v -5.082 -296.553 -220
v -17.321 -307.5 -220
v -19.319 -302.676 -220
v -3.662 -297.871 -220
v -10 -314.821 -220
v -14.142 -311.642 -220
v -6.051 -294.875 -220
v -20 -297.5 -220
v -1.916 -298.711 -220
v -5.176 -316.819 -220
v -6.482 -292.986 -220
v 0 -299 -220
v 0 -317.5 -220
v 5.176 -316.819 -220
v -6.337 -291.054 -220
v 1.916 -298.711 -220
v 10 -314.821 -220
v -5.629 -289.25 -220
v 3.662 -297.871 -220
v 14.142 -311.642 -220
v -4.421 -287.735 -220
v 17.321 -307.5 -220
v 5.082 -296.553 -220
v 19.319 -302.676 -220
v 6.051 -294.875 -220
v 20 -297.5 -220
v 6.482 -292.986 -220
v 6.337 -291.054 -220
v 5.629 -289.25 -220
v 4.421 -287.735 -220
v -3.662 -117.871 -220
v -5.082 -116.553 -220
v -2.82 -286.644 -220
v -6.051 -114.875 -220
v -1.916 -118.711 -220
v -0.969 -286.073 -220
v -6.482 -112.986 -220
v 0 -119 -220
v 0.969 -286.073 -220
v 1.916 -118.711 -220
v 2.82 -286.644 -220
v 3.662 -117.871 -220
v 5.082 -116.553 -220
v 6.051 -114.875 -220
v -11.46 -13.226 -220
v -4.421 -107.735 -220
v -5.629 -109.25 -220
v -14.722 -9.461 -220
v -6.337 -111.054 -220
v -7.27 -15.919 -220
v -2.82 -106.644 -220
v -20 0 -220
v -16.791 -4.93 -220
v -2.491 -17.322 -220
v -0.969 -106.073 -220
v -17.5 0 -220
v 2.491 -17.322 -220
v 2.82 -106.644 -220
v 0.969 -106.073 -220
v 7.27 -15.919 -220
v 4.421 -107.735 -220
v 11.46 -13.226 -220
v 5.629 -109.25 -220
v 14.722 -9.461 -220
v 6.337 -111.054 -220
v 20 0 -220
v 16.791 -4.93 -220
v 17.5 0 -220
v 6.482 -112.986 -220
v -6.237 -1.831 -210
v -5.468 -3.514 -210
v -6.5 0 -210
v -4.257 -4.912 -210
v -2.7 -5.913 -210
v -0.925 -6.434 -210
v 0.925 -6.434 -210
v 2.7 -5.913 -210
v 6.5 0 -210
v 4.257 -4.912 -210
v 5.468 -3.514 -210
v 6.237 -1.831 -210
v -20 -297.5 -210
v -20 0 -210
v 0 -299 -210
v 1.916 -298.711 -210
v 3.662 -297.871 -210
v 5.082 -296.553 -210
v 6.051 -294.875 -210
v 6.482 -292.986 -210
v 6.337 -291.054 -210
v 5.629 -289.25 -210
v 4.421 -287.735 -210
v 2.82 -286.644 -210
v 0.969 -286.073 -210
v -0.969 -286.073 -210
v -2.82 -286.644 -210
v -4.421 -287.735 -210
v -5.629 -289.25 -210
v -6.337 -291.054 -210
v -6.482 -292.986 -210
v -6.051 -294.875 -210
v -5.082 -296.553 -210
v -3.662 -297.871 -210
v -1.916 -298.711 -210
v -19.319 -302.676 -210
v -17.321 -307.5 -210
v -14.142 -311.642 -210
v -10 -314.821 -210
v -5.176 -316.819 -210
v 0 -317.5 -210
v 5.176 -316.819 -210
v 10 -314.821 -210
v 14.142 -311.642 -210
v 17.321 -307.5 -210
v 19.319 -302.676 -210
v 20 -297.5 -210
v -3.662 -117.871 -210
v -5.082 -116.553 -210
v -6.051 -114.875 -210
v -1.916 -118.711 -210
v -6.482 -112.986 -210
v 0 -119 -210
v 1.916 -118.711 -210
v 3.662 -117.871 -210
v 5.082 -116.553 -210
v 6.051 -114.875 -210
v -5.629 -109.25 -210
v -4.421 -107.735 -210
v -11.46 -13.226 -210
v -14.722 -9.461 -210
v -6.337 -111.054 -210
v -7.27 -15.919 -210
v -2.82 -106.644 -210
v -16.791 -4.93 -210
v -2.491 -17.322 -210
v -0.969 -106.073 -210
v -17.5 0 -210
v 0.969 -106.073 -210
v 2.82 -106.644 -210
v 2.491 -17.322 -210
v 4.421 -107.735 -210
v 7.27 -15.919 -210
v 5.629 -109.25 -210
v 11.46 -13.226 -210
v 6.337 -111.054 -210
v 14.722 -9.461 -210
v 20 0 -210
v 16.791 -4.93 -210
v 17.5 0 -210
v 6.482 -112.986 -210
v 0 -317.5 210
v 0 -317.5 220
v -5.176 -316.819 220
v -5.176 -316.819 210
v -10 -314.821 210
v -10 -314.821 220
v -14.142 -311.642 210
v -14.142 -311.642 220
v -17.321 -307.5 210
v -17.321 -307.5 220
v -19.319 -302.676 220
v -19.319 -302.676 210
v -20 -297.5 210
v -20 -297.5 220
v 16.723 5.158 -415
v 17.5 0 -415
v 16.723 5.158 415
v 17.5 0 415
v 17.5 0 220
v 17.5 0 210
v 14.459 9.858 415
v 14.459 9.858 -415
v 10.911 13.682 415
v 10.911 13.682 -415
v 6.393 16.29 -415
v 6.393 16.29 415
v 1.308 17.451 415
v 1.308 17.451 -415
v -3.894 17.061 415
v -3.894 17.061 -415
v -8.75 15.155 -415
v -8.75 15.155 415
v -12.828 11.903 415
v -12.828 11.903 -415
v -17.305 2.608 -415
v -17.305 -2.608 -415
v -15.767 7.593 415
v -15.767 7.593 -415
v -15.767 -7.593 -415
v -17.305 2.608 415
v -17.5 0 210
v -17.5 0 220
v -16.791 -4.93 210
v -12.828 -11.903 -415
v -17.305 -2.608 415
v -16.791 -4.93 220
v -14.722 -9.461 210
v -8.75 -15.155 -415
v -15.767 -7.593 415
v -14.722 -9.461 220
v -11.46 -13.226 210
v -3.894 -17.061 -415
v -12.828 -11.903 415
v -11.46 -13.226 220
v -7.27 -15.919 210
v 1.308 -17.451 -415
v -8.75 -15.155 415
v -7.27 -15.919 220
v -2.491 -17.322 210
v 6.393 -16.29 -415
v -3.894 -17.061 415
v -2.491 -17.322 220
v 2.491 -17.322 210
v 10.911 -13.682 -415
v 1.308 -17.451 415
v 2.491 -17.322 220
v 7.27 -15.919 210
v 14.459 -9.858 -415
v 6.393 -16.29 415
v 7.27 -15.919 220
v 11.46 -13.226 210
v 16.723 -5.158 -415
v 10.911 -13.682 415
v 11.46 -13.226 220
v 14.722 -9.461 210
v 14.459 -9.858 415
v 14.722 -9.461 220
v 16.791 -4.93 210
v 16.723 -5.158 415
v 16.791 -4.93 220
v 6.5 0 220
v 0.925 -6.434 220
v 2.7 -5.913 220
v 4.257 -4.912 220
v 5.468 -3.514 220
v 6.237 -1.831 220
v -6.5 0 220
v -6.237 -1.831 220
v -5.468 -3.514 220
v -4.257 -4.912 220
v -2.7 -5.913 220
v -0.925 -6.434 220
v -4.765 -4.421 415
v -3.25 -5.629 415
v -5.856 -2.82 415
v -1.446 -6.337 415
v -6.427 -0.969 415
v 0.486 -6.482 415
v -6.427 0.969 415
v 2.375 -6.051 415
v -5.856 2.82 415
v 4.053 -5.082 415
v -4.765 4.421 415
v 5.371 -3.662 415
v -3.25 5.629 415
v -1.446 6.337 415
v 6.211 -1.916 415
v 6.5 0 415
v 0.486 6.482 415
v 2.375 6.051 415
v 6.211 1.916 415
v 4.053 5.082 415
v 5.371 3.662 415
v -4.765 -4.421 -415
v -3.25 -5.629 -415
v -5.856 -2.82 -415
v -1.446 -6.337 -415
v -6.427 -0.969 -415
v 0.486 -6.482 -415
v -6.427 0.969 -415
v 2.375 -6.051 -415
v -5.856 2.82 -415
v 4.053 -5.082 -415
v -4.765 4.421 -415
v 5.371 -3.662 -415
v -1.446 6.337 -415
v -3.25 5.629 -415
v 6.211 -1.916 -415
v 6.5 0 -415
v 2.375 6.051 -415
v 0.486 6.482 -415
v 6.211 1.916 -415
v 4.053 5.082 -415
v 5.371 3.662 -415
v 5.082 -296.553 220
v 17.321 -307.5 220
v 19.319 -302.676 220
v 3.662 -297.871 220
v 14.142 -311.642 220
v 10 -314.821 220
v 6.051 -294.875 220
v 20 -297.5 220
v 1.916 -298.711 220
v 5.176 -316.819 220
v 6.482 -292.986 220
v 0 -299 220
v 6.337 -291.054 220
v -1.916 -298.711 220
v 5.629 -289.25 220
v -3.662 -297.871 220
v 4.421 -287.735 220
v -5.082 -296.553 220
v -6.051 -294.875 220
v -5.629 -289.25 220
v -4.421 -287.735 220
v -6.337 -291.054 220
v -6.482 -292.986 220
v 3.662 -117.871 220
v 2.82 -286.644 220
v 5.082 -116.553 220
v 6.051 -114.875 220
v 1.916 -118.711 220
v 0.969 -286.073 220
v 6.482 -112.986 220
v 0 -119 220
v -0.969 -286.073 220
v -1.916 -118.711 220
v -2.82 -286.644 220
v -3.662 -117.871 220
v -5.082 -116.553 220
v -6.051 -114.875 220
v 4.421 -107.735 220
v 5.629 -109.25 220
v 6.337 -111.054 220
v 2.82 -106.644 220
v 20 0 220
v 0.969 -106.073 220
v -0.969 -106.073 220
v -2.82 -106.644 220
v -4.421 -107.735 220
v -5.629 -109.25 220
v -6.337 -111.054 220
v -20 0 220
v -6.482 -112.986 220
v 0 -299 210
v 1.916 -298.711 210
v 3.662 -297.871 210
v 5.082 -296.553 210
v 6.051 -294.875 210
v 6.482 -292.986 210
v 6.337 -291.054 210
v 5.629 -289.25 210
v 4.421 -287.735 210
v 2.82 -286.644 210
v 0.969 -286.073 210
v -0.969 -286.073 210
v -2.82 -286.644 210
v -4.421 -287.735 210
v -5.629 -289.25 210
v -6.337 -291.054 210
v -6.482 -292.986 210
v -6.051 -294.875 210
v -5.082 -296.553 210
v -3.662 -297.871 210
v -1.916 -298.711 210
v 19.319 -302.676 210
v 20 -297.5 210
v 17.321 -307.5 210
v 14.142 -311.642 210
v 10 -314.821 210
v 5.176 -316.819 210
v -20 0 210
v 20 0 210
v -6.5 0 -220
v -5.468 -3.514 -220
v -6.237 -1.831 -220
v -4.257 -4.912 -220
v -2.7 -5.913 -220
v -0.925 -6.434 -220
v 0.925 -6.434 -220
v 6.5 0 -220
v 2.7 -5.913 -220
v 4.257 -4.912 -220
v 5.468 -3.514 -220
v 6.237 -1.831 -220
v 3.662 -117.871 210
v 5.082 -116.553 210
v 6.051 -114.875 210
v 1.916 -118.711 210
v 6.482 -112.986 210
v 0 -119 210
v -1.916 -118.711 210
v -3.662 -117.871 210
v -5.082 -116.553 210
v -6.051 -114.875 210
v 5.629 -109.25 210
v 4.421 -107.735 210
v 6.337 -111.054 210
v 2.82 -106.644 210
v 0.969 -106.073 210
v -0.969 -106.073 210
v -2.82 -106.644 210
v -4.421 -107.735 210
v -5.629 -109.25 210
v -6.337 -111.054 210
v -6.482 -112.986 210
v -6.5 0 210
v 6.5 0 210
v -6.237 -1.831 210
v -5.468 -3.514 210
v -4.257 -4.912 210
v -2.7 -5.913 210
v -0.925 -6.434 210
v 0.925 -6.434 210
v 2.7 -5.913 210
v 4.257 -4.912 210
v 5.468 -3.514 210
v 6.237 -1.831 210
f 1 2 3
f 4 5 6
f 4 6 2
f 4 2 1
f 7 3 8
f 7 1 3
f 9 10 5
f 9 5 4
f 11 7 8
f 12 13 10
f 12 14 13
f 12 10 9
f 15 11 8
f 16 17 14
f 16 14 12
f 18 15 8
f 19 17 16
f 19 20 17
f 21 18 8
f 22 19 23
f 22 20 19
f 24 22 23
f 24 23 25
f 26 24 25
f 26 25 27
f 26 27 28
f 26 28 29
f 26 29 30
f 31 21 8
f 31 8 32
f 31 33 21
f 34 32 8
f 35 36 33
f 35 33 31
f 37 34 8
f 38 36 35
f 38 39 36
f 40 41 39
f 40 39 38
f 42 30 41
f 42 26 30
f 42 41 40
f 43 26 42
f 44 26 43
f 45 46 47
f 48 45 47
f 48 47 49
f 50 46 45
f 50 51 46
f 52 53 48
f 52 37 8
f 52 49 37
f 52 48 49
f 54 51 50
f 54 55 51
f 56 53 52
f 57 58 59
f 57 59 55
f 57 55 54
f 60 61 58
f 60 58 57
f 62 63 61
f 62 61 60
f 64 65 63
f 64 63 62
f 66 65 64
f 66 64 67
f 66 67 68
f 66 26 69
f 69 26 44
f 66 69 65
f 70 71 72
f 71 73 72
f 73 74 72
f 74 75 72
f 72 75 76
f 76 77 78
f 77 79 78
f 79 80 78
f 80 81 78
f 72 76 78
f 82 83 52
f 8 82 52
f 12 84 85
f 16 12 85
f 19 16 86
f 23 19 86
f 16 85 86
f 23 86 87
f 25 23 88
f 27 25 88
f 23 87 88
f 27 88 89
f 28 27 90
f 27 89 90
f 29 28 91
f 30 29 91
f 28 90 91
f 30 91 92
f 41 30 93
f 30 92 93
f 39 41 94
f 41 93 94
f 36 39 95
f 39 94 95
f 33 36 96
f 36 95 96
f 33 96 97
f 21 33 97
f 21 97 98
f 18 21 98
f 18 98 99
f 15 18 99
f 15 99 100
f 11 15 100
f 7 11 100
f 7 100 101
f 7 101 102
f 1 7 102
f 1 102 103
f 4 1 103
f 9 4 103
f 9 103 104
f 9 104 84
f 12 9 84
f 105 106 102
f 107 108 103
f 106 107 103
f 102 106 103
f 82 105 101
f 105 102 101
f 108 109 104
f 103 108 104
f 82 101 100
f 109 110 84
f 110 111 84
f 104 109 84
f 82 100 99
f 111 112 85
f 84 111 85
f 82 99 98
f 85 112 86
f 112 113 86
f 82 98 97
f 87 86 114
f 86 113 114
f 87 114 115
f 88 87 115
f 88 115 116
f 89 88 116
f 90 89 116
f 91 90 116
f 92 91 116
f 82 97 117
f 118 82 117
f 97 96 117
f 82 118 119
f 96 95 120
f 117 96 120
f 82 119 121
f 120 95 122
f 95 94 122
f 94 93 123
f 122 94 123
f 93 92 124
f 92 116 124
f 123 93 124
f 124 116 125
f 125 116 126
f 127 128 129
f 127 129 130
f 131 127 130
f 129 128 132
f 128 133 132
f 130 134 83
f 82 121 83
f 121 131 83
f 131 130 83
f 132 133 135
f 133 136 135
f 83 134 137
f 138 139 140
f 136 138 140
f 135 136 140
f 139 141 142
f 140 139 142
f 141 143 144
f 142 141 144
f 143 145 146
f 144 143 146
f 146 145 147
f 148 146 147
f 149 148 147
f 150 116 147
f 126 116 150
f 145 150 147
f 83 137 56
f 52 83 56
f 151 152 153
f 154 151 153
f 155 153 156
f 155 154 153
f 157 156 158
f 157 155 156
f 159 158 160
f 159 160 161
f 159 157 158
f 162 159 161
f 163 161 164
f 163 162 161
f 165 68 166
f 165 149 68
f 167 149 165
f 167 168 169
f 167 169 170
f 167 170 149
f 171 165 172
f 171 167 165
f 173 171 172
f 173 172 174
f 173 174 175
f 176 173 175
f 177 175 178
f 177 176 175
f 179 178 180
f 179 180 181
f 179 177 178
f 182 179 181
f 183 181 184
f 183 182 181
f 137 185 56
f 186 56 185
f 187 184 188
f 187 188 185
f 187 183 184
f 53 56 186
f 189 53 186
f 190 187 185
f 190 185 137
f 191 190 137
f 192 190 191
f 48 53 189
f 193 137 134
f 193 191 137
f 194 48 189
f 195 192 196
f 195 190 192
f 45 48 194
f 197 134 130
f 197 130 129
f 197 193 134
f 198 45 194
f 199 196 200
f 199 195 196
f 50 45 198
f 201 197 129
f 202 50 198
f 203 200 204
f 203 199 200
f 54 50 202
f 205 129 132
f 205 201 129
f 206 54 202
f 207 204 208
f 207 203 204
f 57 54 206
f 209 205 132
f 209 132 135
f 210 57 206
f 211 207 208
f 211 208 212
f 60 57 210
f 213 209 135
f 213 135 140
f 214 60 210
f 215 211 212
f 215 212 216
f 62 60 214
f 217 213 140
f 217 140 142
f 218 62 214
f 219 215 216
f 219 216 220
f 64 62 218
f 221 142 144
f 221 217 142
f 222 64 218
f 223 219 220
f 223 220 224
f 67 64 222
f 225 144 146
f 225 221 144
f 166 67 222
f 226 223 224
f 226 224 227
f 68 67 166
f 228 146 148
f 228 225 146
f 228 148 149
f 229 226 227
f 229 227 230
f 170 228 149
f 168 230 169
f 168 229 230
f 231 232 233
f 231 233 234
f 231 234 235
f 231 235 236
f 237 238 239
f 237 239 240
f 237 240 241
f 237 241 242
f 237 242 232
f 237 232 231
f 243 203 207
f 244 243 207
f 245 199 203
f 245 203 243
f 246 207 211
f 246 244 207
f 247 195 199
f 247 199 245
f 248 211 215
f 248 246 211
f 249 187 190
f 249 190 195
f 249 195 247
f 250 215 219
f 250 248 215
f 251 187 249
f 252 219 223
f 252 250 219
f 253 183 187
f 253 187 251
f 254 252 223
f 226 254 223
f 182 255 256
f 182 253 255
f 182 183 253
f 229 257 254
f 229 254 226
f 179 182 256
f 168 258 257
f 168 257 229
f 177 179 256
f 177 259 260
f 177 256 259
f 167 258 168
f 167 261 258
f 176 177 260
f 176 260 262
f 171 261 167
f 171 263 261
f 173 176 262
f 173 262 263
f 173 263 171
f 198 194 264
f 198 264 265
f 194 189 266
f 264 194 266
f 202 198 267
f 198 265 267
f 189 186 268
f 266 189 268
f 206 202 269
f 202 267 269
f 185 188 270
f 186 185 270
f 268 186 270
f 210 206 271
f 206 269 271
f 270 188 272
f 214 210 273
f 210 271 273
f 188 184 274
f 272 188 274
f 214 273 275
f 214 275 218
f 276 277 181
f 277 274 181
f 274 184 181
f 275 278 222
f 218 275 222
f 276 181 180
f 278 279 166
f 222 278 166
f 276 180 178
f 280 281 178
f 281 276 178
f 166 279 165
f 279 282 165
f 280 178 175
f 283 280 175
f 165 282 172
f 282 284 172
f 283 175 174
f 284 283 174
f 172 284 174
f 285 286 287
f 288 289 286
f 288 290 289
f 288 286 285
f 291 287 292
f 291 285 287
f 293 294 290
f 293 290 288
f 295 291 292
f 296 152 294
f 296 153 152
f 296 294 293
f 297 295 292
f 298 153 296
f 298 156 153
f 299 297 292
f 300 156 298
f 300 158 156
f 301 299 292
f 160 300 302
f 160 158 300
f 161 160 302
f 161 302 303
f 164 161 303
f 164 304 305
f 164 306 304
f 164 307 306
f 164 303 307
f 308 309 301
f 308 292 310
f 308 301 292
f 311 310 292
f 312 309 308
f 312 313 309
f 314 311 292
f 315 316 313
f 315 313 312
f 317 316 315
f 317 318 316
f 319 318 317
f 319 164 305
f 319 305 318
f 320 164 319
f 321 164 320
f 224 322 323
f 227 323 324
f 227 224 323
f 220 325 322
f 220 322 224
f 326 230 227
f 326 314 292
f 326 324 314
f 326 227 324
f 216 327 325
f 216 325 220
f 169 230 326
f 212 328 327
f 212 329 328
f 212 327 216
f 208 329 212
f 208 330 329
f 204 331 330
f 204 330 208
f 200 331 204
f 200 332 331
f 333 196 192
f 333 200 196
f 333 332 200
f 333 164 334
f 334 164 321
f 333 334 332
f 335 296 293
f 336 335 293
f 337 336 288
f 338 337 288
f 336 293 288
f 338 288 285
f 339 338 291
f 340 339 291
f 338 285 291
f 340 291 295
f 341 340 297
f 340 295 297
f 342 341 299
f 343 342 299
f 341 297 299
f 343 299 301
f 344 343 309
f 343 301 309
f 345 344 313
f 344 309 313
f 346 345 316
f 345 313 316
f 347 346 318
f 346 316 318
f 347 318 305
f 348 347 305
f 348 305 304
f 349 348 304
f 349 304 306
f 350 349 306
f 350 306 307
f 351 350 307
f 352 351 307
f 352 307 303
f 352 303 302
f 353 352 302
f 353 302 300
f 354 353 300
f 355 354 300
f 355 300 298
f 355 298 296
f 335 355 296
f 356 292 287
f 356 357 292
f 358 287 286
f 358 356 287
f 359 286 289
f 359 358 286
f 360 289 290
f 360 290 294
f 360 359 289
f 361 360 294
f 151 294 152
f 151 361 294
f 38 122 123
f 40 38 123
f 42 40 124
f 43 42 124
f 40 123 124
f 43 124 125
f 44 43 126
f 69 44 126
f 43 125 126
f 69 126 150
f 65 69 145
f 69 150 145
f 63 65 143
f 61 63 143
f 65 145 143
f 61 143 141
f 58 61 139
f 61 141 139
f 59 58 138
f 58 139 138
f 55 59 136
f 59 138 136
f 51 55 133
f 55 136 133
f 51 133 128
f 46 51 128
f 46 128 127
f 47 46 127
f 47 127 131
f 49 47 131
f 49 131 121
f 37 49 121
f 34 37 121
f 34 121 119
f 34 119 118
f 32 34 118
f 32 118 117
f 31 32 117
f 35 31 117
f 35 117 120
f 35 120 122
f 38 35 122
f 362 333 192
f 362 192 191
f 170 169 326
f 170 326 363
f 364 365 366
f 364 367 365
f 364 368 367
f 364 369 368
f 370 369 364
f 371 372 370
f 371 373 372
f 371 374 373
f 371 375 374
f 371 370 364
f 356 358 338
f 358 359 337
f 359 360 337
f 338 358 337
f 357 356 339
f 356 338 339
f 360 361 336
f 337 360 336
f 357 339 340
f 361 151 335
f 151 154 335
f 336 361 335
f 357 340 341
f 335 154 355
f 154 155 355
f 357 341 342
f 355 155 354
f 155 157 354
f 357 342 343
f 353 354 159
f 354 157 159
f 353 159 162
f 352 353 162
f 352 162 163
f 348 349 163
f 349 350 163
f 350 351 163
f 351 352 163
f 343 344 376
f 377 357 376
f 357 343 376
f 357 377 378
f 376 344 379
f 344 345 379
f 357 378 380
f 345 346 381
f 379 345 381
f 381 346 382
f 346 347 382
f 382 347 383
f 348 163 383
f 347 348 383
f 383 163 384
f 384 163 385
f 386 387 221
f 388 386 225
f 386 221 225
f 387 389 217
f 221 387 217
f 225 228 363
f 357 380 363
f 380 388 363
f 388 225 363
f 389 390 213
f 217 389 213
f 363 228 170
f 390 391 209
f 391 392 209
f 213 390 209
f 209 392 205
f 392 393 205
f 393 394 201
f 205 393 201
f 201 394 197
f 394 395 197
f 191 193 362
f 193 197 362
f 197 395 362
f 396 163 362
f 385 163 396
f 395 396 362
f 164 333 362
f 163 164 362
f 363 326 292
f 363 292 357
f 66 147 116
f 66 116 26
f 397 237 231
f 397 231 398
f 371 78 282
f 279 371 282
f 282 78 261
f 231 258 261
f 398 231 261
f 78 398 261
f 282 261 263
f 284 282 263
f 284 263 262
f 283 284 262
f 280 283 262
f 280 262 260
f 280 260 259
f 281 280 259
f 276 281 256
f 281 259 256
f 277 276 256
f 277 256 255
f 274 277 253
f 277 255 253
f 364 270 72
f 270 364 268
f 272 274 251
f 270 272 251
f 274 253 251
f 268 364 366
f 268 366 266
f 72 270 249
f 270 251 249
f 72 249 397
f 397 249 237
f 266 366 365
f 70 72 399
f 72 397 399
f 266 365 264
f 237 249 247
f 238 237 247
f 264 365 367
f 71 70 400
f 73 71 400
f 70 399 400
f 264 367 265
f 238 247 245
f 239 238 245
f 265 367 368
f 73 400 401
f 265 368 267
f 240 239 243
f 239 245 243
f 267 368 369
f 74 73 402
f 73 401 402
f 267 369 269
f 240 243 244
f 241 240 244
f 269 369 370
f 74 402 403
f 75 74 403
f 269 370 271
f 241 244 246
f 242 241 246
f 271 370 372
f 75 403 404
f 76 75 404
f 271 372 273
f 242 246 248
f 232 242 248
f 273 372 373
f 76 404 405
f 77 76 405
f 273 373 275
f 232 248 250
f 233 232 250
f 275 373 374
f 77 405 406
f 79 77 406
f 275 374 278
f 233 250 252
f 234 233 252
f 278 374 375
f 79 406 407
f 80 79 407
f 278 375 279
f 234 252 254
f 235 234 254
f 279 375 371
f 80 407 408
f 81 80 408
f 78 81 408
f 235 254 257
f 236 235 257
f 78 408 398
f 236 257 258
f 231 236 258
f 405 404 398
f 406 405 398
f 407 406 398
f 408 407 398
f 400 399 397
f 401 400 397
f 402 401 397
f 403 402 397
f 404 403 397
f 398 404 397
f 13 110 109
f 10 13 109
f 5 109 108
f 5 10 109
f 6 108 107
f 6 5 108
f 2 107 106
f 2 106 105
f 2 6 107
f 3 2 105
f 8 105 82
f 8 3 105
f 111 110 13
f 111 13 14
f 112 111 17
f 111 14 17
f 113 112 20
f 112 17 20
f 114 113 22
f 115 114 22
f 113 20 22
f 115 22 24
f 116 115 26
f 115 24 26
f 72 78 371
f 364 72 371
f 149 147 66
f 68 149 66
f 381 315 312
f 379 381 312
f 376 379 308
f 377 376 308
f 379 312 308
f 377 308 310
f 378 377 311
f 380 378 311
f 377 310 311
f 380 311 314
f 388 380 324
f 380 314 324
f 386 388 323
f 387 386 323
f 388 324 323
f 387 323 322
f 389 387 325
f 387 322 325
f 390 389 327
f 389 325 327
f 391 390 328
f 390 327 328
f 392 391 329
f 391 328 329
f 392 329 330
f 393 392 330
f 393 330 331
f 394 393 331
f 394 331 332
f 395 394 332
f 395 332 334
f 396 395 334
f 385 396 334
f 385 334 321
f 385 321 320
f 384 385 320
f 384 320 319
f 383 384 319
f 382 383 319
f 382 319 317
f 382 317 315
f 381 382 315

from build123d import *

# Parameters (mm, degrees)
SKETCH1_R           = 17.5
BOSS_EXTRUDE1_DEPTH = 415
CUT_EXTRUDE1_REACH  = 832.369
SKETCH2_R           = 6.5
SKETCH3_W           = 10
SKETCH3_H           = 317.5
BOSS_EXTRUDE2_DEPTH = 20
FILLET1_R           = 20
SKETCH4_R           = 6.5
CUT_EXTRUDE2_DEPTH  = 542


with BuildPart() as part:
    # Sketch1 → Boss-Extrude1 (new, symmetric)
    with BuildSketch(Plane.XY):
        Circle(SKETCH1_R)
    extrude(amount=BOSS_EXTRUDE1_DEPTH, both=True)

    # Sketch2 → Cut-Extrude1 (cut, up to next)
    with BuildSketch(Plane.XY.offset(415), mode=Mode.PRIVATE) as cut_extrude1_sk1:
        Circle(SKETCH2_R)
    cut_extrude1_tool1 = extrude(cut_extrude1_sk1.sketch, amount=-CUT_EXTRUDE1_REACH, mode=Mode.PRIVATE) & part.part
    add(cut_extrude1_tool1.solids().sort_by_distance((0, 0, 415))[0], mode=Mode.SUBTRACT)

    # Sketch3 → Boss-Extrude2 (add, symmetric)
    with BuildSketch(Plane(origin=(0, 0, 0), x_dir=(0, 0, -1), z_dir=(1, 0, 0))):
        with Locations((-215, -158.75)):
            Rectangle(SKETCH3_W, SKETCH3_H)
        with Locations((215, -158.75)):
            Rectangle(SKETCH3_W, SKETCH3_H)
    extrude(amount=BOSS_EXTRUDE2_DEPTH, both=True)

    # Fillet1
    fillet1_edges = [part.edges().sort_by_distance(p)[0] for p in [
        (-20, -317.5, -215),
        (20, -317.5, -215),
        (-20, -317.5, 215),
        (20, -317.5, 215),
    ]]
    fillet(fillet1_edges, radius=FILLET1_R - 0.0001)  # a hair under: the kernel refuses the full size

    # Sketch4 → Cut-Extrude2 (cut)
    with BuildSketch(Plane.XY.offset(220)):
        with Locations(Location((0, -292.5, 0), (0, 0, 270))):
            Circle(SKETCH4_R)
        with Locations(Location((0, -112.5, 0), (0, 0, 270))):
            Circle(SKETCH4_R)
    extrude(amount=-CUT_EXTRUDE2_DEPTH, mode=Mode.SUBTRACT)


solid = part.part
